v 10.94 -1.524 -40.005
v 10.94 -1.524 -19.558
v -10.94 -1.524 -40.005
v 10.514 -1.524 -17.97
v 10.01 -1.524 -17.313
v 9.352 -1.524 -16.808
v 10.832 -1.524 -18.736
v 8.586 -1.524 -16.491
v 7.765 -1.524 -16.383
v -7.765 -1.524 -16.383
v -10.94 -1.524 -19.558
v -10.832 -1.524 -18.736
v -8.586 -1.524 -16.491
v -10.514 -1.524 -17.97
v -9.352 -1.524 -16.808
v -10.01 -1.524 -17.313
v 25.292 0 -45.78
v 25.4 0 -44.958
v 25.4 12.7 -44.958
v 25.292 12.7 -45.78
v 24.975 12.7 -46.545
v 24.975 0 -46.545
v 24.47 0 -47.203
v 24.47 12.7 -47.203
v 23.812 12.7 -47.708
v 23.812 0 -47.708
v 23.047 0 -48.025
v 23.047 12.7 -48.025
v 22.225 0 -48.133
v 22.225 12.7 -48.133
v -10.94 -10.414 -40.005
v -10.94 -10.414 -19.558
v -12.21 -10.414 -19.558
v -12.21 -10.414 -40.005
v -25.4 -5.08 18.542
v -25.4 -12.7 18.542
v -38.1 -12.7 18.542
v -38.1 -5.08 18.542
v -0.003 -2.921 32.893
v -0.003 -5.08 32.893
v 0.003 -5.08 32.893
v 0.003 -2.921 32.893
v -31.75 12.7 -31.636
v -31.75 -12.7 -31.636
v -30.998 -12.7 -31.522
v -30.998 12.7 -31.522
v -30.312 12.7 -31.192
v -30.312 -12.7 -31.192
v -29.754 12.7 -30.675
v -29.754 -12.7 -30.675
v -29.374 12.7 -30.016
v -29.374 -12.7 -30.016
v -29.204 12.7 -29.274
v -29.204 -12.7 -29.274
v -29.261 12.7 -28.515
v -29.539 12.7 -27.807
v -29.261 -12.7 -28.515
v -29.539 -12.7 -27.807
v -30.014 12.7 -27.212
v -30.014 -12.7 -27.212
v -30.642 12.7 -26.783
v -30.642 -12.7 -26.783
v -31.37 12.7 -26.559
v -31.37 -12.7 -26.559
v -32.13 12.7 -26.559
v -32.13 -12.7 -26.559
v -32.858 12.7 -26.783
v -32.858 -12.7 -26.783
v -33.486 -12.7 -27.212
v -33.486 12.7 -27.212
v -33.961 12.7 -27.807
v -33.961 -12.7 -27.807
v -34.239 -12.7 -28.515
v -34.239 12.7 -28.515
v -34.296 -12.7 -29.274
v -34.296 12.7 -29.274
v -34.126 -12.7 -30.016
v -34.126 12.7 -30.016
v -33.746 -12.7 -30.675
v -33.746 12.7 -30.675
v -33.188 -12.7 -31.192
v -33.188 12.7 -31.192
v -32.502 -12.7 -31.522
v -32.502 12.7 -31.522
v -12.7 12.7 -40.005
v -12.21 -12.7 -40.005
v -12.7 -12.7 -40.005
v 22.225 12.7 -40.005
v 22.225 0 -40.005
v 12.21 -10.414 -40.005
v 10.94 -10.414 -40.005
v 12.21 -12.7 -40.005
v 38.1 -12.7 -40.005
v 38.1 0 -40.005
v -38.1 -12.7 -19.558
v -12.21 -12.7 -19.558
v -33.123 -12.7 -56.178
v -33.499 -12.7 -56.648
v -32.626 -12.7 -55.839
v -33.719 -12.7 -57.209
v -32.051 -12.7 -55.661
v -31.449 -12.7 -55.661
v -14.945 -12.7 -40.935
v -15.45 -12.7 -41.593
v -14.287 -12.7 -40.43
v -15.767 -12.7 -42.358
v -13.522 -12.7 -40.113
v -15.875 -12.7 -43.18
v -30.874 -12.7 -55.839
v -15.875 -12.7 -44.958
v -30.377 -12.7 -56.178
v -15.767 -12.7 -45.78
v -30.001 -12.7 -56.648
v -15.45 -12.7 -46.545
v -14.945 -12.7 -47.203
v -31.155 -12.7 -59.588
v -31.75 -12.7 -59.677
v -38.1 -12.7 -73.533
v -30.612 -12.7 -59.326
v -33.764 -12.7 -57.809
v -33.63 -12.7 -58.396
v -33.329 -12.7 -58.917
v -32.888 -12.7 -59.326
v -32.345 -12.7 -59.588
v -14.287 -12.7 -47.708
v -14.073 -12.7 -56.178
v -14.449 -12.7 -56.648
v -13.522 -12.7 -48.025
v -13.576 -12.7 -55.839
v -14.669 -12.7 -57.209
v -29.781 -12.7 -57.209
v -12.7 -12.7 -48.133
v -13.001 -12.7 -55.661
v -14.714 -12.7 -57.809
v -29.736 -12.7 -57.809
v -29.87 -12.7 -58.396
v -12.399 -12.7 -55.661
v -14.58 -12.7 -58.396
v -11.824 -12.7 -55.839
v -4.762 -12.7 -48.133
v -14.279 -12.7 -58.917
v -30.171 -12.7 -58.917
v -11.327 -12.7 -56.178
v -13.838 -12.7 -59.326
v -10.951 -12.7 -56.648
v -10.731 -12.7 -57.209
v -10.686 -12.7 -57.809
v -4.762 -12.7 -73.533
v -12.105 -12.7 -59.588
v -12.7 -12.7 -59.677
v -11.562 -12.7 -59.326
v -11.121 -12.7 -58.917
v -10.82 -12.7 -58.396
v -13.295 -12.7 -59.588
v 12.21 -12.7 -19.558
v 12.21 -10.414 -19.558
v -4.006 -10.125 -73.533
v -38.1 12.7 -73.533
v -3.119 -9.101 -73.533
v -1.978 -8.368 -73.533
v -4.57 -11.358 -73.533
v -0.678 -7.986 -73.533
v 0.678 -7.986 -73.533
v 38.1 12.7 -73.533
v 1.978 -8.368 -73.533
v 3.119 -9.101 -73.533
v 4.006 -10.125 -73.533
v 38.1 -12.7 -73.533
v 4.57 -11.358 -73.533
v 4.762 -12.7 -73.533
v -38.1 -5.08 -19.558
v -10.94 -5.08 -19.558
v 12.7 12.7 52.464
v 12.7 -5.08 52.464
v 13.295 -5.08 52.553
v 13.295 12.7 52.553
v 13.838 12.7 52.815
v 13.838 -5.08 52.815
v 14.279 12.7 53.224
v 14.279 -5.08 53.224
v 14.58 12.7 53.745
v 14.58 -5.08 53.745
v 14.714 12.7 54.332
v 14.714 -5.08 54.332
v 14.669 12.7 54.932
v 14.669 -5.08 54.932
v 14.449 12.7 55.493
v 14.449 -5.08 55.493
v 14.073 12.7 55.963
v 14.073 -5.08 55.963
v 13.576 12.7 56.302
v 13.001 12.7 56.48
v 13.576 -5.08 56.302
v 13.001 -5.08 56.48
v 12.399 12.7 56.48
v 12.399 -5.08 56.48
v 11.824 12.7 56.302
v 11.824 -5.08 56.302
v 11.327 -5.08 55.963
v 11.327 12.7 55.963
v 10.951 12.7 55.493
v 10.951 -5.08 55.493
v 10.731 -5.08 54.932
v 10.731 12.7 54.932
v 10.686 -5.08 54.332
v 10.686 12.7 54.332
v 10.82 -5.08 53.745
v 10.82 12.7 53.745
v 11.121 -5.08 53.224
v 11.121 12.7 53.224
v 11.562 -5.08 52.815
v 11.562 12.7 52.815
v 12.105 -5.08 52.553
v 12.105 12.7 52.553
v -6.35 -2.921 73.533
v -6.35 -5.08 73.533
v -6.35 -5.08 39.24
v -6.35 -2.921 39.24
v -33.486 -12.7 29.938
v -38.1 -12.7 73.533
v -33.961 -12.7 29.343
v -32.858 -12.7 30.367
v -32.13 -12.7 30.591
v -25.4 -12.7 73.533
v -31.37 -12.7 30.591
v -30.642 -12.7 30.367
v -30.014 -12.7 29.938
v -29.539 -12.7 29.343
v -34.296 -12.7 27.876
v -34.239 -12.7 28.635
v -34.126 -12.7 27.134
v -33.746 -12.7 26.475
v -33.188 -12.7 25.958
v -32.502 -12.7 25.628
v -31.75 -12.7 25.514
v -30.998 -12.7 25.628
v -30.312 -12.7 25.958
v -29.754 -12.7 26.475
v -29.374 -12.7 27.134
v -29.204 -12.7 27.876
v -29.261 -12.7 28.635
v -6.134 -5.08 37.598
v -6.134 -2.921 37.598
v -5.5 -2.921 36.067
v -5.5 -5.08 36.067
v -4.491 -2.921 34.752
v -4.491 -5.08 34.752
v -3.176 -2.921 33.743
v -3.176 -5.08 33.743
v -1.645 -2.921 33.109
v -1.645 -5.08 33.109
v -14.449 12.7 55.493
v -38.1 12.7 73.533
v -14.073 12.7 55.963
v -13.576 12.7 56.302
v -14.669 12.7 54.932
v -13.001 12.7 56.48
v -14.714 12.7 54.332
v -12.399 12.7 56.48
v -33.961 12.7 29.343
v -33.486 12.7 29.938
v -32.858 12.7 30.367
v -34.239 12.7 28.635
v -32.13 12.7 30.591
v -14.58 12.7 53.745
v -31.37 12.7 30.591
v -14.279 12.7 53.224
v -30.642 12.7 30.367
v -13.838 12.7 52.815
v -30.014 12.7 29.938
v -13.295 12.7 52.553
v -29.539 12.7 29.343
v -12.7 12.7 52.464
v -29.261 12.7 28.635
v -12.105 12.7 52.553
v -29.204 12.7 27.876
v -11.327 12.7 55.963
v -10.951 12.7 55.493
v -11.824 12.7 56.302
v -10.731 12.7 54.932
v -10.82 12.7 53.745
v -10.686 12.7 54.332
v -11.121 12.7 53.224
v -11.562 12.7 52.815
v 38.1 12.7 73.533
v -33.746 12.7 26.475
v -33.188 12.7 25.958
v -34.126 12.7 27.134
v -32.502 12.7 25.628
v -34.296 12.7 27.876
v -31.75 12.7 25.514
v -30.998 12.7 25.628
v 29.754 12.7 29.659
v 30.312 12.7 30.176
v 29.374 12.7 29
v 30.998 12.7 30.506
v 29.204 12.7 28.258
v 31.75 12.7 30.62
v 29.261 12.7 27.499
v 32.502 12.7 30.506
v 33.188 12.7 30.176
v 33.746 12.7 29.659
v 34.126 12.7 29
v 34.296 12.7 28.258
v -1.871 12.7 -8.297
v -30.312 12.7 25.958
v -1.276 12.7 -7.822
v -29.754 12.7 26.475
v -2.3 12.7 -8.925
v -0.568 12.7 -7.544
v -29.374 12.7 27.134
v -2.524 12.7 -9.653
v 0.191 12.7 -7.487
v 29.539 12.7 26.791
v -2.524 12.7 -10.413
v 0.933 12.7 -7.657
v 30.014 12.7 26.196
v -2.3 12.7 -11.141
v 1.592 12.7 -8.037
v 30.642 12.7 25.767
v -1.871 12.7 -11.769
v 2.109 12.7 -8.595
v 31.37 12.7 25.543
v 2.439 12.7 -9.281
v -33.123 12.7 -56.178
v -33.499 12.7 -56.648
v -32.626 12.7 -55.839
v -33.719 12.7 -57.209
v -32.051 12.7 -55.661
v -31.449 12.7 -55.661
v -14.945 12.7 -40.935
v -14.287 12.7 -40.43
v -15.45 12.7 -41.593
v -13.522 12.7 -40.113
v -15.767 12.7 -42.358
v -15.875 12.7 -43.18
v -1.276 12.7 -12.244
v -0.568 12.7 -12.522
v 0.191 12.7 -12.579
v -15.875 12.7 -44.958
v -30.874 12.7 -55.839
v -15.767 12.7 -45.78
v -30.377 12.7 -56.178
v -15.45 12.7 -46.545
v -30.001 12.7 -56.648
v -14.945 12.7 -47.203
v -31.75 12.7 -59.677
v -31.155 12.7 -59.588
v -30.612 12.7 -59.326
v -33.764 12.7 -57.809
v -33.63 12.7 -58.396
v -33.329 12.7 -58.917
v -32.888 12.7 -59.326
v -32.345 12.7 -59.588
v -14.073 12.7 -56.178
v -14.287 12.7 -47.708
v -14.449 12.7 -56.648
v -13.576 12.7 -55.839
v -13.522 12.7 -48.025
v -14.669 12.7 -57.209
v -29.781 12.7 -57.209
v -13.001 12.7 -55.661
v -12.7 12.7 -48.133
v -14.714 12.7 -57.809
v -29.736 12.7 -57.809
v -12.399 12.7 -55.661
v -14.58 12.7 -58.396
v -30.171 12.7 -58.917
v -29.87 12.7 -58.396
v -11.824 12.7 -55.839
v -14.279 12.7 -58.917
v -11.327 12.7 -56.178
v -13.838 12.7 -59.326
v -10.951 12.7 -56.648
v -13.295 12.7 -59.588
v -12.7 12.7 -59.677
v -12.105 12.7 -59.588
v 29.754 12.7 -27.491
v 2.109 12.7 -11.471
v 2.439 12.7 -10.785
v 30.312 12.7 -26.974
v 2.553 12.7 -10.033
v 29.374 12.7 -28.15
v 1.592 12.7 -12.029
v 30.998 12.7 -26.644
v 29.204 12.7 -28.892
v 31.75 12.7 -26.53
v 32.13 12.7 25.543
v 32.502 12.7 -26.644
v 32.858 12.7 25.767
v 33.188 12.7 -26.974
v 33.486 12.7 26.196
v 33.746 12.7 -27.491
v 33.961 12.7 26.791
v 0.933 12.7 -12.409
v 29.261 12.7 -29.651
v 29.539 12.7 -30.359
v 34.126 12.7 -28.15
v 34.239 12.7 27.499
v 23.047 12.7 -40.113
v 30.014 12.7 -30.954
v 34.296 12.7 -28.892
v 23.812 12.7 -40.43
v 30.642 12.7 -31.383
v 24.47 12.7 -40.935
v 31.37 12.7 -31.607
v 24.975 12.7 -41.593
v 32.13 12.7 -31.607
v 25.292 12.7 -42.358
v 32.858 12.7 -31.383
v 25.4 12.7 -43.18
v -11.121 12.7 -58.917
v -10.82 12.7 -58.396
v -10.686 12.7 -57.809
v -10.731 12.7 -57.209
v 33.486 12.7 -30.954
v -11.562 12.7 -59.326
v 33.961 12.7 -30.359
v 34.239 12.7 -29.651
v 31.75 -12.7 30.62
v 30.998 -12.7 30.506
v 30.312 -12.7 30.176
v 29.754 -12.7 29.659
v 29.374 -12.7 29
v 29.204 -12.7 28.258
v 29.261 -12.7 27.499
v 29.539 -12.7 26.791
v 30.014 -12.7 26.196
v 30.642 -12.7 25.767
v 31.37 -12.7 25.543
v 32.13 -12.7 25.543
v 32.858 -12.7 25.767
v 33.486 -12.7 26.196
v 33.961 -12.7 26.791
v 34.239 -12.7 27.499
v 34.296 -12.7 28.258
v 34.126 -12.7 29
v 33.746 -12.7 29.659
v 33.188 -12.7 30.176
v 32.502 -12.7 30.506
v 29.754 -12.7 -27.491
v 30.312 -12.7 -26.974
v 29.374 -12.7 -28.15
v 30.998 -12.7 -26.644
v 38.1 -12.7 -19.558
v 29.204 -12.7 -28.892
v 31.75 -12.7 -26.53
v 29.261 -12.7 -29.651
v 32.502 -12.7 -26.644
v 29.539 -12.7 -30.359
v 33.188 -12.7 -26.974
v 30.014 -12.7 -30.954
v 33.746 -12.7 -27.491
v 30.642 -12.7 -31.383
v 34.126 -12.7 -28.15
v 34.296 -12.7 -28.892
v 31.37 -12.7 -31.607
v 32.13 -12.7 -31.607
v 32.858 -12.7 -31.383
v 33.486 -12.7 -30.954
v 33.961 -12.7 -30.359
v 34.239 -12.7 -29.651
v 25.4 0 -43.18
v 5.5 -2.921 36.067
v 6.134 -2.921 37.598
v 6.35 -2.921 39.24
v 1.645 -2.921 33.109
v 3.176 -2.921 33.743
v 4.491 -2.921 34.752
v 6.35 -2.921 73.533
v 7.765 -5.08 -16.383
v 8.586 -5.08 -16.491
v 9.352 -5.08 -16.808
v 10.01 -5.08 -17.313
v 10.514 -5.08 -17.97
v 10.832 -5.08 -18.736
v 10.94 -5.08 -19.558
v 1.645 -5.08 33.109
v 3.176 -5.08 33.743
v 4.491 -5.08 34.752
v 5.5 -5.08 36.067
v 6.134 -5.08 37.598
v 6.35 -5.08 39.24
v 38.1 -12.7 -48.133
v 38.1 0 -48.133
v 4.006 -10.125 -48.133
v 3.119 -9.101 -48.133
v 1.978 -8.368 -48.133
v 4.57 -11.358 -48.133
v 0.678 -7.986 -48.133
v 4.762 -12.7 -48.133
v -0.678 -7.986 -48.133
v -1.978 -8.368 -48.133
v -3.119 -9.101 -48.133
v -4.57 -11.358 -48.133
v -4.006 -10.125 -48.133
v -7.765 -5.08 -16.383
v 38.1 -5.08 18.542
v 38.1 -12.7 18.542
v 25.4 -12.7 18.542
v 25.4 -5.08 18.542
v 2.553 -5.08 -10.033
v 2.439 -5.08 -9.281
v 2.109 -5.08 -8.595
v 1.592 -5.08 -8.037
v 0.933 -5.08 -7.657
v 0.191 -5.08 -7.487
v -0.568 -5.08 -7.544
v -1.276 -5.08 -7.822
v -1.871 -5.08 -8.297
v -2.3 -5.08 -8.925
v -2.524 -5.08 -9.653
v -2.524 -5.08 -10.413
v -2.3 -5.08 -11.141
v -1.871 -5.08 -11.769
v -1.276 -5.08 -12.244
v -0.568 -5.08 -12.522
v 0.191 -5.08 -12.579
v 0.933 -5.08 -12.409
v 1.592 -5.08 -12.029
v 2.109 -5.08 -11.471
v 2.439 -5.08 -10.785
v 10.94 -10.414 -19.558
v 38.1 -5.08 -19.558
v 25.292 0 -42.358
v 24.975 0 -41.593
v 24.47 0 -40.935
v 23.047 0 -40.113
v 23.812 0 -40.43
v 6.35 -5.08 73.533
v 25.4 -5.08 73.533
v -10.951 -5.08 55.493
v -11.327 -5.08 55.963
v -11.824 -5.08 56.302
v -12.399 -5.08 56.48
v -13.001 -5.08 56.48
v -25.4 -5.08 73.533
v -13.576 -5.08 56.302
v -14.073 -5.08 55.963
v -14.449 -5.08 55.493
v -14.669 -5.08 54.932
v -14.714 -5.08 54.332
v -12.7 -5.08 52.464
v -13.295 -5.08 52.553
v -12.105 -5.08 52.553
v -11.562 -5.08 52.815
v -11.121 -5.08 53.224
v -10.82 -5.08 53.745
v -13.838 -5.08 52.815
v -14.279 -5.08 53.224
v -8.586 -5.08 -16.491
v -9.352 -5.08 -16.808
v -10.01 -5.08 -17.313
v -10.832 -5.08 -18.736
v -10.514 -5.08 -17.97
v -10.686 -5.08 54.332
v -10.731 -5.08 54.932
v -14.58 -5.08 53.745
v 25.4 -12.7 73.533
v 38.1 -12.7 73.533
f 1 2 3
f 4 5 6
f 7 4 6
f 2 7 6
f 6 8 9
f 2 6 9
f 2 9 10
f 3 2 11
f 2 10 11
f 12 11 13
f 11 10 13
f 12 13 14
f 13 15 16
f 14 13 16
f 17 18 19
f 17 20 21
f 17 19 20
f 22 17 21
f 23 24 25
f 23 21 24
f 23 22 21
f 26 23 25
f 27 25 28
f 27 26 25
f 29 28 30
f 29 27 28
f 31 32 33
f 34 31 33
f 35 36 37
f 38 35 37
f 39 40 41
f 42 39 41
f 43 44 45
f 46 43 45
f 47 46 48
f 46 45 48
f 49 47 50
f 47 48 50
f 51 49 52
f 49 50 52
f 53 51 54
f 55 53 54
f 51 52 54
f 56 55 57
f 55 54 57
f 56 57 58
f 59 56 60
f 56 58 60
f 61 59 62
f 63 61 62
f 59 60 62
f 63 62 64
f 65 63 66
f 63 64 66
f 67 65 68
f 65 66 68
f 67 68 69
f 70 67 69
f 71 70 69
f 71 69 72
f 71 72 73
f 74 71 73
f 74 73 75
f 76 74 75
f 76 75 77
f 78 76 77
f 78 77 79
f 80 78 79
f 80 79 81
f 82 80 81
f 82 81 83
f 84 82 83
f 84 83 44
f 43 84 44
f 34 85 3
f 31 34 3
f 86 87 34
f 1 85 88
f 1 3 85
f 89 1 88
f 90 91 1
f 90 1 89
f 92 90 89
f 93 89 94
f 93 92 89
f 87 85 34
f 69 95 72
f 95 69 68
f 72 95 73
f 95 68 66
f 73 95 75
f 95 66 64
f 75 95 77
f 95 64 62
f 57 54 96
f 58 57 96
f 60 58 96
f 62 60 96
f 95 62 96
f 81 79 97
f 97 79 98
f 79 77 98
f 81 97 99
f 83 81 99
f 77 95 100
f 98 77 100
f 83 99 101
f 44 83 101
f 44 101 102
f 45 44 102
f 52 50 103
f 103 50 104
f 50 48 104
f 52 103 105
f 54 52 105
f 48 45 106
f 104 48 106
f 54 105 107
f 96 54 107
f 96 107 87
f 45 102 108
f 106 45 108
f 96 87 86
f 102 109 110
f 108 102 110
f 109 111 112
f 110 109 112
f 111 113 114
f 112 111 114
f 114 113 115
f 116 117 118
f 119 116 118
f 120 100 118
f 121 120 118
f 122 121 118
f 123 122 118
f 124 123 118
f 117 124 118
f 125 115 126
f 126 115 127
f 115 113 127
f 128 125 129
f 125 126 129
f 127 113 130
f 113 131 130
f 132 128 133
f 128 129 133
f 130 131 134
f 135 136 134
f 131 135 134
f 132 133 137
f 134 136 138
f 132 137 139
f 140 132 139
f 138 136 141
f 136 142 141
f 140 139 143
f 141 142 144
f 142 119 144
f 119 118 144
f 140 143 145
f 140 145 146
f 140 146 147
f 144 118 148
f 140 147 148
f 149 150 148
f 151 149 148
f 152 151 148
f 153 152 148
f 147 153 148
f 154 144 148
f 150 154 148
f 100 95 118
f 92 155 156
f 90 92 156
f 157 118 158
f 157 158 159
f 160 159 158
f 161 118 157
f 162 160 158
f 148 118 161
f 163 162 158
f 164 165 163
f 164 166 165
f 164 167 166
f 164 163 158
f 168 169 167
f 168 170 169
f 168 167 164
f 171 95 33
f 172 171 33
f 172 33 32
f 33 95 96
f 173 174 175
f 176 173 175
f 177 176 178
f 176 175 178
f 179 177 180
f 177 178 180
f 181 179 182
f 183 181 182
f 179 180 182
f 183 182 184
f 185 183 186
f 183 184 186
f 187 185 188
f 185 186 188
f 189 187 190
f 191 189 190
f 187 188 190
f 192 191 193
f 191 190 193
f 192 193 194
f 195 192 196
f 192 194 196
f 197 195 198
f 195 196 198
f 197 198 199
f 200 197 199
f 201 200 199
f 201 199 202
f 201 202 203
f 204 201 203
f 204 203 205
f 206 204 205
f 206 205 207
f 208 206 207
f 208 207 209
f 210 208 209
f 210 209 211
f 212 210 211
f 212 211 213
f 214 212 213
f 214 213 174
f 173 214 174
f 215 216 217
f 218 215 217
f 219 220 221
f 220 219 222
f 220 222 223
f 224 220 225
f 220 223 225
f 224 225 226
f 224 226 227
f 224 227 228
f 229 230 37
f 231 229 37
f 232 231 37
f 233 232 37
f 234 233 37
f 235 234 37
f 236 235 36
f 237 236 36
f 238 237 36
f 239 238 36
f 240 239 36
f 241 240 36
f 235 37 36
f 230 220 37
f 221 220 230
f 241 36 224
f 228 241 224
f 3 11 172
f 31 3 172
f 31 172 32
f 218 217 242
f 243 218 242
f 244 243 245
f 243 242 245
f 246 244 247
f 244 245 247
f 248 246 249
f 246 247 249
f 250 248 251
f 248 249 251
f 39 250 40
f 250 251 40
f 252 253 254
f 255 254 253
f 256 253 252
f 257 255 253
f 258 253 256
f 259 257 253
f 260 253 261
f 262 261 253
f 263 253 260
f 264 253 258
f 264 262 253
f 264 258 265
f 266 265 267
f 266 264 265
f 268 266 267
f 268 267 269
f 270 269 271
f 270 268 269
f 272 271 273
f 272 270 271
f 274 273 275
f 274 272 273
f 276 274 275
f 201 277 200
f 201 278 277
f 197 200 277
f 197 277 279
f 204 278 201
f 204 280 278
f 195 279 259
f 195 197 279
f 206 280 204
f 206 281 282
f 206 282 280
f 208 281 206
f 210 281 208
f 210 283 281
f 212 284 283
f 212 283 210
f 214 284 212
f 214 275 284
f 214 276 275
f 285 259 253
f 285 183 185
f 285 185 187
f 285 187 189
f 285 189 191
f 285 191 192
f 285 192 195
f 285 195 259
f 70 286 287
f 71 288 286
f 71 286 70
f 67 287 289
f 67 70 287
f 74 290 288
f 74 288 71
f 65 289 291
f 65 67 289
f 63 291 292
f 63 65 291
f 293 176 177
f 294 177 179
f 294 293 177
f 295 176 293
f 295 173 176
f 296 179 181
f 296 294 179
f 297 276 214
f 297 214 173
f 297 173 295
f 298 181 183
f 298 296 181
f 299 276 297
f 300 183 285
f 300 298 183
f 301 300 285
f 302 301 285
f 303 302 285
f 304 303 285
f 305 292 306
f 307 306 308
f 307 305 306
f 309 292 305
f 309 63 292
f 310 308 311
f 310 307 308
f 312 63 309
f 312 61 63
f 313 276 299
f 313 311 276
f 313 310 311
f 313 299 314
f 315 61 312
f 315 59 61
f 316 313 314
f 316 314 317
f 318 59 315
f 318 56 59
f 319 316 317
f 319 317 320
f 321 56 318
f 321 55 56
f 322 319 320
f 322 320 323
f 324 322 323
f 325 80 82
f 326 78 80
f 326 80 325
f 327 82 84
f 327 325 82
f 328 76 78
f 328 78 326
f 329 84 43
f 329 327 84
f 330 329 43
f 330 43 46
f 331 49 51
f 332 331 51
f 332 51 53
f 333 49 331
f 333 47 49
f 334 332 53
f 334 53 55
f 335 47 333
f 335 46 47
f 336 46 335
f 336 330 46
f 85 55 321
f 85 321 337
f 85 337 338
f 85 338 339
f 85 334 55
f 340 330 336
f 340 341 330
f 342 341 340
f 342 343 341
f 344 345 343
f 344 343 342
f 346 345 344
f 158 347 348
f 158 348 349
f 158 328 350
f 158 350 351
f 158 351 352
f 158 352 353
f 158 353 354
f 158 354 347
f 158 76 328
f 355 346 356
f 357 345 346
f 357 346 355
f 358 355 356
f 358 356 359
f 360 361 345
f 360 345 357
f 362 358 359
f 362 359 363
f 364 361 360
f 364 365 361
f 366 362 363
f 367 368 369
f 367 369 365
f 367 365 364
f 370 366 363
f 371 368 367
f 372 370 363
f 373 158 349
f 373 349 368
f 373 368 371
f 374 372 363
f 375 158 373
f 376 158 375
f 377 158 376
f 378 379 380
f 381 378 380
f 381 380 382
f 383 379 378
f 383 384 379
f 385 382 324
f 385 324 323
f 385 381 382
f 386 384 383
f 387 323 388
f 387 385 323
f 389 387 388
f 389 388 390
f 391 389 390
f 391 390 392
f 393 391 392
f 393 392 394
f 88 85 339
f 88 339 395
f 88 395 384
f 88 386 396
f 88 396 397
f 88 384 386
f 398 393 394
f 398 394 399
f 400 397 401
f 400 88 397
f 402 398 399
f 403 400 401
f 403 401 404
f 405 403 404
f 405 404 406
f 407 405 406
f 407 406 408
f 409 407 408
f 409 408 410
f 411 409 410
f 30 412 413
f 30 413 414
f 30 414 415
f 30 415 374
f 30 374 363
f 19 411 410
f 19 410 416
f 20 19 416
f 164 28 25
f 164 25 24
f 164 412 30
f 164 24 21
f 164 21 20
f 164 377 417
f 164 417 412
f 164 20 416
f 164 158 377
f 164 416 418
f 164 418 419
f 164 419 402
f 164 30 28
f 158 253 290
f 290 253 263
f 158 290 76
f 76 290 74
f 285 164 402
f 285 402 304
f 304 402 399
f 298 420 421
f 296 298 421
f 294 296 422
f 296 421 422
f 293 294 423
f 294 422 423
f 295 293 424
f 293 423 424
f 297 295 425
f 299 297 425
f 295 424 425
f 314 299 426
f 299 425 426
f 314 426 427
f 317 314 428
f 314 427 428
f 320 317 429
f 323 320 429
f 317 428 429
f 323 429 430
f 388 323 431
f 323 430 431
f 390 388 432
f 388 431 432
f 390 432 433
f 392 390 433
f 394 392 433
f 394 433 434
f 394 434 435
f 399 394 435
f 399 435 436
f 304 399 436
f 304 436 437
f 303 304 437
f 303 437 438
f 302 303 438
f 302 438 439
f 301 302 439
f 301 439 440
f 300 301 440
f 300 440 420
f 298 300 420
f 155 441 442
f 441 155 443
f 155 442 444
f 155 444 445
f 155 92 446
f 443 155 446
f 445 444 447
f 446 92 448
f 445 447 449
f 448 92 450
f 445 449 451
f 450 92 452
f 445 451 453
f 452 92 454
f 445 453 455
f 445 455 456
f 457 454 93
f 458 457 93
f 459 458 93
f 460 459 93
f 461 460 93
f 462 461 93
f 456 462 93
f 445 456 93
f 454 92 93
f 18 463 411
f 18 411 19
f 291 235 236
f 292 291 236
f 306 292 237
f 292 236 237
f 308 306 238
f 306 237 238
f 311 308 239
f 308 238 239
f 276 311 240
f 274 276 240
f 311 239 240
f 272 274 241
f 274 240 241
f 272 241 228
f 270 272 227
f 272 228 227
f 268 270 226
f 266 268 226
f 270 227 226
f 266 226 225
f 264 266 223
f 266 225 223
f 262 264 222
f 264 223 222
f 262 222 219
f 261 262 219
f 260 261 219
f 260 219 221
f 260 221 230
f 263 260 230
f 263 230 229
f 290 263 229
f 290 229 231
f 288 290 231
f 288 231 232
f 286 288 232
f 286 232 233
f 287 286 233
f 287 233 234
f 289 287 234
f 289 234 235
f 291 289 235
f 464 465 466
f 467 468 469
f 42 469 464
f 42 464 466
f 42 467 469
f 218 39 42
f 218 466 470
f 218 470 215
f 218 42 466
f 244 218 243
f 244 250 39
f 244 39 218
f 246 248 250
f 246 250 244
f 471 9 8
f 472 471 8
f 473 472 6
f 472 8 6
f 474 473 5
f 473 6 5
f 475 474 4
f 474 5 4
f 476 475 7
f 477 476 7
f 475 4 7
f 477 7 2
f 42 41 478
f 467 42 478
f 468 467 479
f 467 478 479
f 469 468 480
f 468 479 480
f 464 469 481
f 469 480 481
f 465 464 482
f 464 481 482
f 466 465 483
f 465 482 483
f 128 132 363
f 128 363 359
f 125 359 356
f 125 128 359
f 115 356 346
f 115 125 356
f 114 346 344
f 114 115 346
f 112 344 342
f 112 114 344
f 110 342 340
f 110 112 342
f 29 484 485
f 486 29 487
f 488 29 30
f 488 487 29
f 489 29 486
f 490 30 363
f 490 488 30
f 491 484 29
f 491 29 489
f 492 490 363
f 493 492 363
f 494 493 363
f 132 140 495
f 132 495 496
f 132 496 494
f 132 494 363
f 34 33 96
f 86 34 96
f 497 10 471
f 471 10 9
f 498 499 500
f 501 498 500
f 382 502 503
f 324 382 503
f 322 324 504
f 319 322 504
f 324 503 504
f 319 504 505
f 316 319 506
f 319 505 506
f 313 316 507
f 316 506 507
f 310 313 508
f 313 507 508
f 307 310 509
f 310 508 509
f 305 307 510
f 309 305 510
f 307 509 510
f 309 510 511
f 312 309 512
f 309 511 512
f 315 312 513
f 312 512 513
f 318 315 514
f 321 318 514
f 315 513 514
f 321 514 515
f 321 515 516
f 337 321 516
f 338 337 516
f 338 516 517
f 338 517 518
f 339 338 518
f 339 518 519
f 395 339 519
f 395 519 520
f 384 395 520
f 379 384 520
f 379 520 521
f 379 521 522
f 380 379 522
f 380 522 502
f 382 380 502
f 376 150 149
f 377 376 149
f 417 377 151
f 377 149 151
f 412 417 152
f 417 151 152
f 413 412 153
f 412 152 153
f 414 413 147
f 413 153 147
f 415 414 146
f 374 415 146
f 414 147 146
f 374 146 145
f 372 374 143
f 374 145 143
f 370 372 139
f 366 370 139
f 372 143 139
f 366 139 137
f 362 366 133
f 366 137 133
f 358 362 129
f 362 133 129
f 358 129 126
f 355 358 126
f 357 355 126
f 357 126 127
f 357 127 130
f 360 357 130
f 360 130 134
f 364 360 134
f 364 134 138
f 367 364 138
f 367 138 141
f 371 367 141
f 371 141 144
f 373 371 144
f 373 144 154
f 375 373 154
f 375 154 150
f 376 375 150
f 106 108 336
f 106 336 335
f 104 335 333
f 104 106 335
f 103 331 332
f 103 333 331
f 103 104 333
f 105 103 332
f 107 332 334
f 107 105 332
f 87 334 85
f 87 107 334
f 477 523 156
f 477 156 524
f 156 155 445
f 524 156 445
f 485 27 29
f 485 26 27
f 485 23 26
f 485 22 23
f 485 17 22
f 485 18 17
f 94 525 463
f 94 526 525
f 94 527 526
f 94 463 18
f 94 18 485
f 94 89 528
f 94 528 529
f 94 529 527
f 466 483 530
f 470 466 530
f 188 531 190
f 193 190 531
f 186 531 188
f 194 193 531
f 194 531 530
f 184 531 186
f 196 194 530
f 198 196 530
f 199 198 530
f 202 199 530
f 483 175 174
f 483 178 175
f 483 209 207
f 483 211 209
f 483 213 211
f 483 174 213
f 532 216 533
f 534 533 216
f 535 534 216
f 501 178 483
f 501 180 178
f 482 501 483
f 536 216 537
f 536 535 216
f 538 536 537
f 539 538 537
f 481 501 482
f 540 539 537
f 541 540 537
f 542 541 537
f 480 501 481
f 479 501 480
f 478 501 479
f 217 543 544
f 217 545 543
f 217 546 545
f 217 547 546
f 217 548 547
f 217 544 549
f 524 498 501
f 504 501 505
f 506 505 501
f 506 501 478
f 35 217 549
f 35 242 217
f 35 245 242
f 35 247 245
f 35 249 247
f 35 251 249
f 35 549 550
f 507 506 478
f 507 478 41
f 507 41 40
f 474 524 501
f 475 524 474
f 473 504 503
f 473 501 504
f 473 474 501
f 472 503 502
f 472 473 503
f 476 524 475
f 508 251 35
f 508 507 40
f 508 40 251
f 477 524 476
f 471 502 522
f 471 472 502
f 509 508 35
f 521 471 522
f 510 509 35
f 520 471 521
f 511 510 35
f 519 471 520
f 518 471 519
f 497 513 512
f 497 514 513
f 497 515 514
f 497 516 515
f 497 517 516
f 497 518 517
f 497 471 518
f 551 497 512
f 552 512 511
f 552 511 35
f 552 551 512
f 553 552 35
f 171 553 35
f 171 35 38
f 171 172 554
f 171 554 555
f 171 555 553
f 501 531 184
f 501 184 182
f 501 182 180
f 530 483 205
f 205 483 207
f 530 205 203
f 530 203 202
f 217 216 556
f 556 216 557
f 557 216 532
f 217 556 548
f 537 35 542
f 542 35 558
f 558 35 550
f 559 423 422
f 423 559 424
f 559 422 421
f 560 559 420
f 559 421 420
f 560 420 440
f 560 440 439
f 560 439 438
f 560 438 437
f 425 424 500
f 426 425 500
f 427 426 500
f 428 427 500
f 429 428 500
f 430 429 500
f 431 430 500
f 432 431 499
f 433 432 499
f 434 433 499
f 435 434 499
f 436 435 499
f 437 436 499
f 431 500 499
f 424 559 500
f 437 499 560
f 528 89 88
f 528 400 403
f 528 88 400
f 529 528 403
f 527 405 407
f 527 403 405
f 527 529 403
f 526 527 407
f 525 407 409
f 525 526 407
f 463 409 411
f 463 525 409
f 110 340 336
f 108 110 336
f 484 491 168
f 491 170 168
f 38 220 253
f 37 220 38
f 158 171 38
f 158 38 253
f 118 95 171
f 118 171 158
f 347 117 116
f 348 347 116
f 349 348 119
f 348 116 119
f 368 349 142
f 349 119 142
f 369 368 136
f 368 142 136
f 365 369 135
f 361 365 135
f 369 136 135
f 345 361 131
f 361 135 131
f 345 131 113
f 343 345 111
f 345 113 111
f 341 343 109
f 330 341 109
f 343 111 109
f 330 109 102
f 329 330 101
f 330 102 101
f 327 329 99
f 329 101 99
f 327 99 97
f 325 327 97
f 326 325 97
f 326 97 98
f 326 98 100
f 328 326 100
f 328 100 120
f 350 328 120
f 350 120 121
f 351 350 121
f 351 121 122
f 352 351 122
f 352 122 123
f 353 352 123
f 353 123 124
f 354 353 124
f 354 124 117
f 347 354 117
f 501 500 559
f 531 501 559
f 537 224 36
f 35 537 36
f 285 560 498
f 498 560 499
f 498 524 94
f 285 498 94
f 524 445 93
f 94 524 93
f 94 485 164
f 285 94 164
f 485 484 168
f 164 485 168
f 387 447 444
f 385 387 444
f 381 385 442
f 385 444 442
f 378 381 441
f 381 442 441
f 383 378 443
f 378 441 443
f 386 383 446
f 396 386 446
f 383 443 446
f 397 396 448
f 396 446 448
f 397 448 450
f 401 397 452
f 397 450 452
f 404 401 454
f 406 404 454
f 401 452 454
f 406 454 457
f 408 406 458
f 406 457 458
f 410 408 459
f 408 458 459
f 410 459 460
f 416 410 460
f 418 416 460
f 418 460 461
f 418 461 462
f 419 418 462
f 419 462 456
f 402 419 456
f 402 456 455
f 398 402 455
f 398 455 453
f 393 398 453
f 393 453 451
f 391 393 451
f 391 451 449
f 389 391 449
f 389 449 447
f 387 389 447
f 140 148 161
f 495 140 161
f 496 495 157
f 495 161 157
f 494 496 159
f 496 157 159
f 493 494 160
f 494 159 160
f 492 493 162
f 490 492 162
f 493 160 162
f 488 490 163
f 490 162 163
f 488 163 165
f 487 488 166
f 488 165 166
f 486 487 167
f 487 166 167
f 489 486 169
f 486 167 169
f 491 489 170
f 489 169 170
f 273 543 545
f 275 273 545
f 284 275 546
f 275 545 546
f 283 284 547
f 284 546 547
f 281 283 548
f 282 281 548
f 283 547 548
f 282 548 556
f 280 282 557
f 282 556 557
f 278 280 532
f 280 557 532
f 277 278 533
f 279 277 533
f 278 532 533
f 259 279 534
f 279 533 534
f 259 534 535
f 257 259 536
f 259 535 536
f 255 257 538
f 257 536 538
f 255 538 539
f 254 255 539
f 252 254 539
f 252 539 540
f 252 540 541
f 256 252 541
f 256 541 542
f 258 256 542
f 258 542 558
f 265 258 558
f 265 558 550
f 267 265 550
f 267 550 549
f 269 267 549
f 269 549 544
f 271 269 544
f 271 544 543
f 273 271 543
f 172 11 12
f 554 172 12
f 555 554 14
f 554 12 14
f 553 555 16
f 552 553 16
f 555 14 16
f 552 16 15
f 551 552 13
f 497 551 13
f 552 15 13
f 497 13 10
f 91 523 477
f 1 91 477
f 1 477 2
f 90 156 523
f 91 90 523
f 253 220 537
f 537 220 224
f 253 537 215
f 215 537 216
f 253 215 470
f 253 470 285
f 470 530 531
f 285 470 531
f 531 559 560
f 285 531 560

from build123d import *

# Parameters (mm, degrees)
BOSS_EXTRUDE1_DEPTH         = 12.7
BOSS_EXTRUDE1_DEPTH_BACK    = 12.7
SKETCH1_W                   = 76.2
SKETCH1_H                   = 147.066
SKETCH2_R                   = 4.7625
CUT_EXTRUDE1_DEPTH          = 25.4
CUT_EXTRUDE2_DEPTH          = 7.62
CUT_EXTRUDE4_DEPTH          = 84.785452729
CUT_EXTRUDE4_DEPTH_BACK     = 84.785452729
F_1_4_20_TAPPED_HOLE1_D     = 5.1054
F_1_4_20_TAPPED_HOLE1_DEPTH = 19.05
F_1_4_20_TAPPED_HOLE1_TIP   = 1.533816902
SKETCH9_R                   = 2.5527
SKETCH9_R_2                 = 2.0193
CUT_EXTRUDE5_DEPTH          = 87.62489301
CUT_EXTRUDE6_REACH          = 103.385
CUT_EXTRUDE7_DEPTH          = 2.159
SKETCH12_R                  = 2.0193
CUT_EXTRUDE8_DEPTH          = 85.704430162
SKETCH13_W                  = 15.875
SKETCH13_H                  = 8.128
CUT_EXTRUDE9_DEPTH          = 12.7
CUT_EXTRUDE10_DEPTH         = 85.02996052


with BuildPart() as part:
    # Sketch1 → Boss-Extrude1 (new, two sides: drawn at the far end of the back side and taken through both)
    with BuildSketch(Plane(origin=(0, 0, 0), x_dir=(1, 0, 0), z_dir=(0, 1, 0)).offset(-BOSS_EXTRUDE1_DEPTH_BACK)):
        Rectangle(SKETCH1_W, SKETCH1_H)
    extrude(amount=BOSS_EXTRUDE1_DEPTH + BOSS_EXTRUDE1_DEPTH_BACK)

    # Sketch2 → Cut-Extrude1 (cut)
    with BuildSketch(Plane(origin=(0, 0, -73.533), x_dir=(-1, 0, 0), z_dir=(0, 0, -1))):
        with Locations((0, -12.7)):
            Circle(SKETCH2_R)
    extrude(amount=-CUT_EXTRUDE1_DEPTH, mode=Mode.SUBTRACT)

    # Sketch3 → Cut-Extrude2 (cut)
    with BuildSketch(Plane(origin=(0, -12.7, 0), x_dir=(-1, 0, 0), z_dir=(0, -1, 0))):
        with BuildLine():
            Line((-19.05, -83.058), (19.05, -83.058))
            ThreePointArc((19.05, -83.058), (23.540128061, -81.198128061), (25.4, -76.708))
            Line((25.4, -76.708), (25.4, -18.542))
            Line((25.4, -18.542), (44.45, -18.542))
            Line((44.45, -18.542), (44.45, 19.558))
            Line((44.45, 19.558), (-44.45, 19.558))
            Line((-44.45, 19.558), (-44.45, -18.542))
            Line((-44.45, -18.542), (-25.4, -18.542))
            Line((-25.4, -18.542), (-25.4, -76.708))
            ThreePointArc((-25.4, -76.708), (-23.540128061, -81.198128061), (-19.05, -83.058))
        make_face()
    extrude(amount=-CUT_EXTRUDE2_DEPTH, mode=Mode.SUBTRACT)

    # Sketch5 → Cut-Extrude4 (cut, two sides: drawn at the far end of the back side and taken through both)
    with BuildSketch(Plane(origin=(0, 0, 0), x_dir=(1, 0, 0), z_dir=(0, 1, 0)).offset(-CUT_EXTRUDE4_DEPTH_BACK)):
        with BuildLine():
            Line((22.225, 48.133), (-12.7, 48.133))
            ThreePointArc((-12.7, 48.133), (-14.94506403, 47.20306403), (-15.875, 44.958))
            Line((-15.875, 44.958), (-15.875, 43.18))
            ThreePointArc((-15.875, 43.18), (-14.94506403, 40.93493597), (-12.7, 40.005))
            Line((-12.7, 40.005), (22.225, 40.005))
            ThreePointArc((22.225, 40.005), (24.47006403, 40.93493597), (25.4, 43.18))
            Line((25.4, 43.18), (25.4, 44.958))
            ThreePointArc((25.4, 44.958), (24.47006403, 47.20306403), (22.225, 48.133))
        make_face()
    extrude(amount=CUT_EXTRUDE4_DEPTH + CUT_EXTRUDE4_DEPTH_BACK, mode=Mode.SUBTRACT)

    # 1/4-20 Tapped Hole1
    with Locations(Plane(origin=(-11.034450397, 12.7, 14.547513529), x_dir=(-1, 0, 0), z_dir=(0, 1, 0))):
        with Locations((-11.034450397, -24.580513529)):
            Hole(F_1_4_20_TAPPED_HOLE1_D / 2, depth=F_1_4_20_TAPPED_HOLE1_DEPTH)
            with Locations((0, 0, -(F_1_4_20_TAPPED_HOLE1_DEPTH + F_1_4_20_TAPPED_HOLE1_TIP / 2))):  # 118° drill point
                Cone(0, F_1_4_20_TAPPED_HOLE1_D / 2, F_1_4_20_TAPPED_HOLE1_TIP, mode=Mode.SUBTRACT)

    # Sketch9 → Cut-Extrude5 (cut, through all)
    with BuildSketch(Plane(origin=(0, -12.7, 0), x_dir=(-1, 0, 0), z_dir=(0, -1, 0))):
        with Locations((31.75, 29.083)):
            Circle(SKETCH9_R)
        with Locations((31.75, -28.067)):
            Circle(SKETCH9_R)
        with Locations((-31.75, -28.067)):
            Circle(SKETCH9_R)
        with Locations((-31.75, 29.083)):
            Circle(SKETCH9_R)
        with Locations((31.75, 57.658)):
            Circle(SKETCH9_R_2)
        with Locations((12.7, 57.658)):
            Circle(SKETCH9_R_2)
    extrude(amount=-CUT_EXTRUDE5_DEPTH, mode=Mode.SUBTRACT)

    # Sketch10 → Cut-Extrude6 (cut, up to next)
    with BuildSketch(Plane.XY.offset(-19.558), mode=Mode.PRIVATE) as cut_extrude6_sk1:
        with BuildLine():
            Line((-10.939706577, -10.414), (-12.209706577, -10.414))
            Line((-12.209706577, -10.414), (-12.209706577, -14.986))
            Line((-12.209706577, -14.986), (-10.939706577, -14.986))
            ThreePointArc((-10.939706577, -14.986), (0, -23.876), (10.939706577, -14.986))
            Line((10.939706577, -14.986), (12.209706577, -14.986))
            Line((12.209706577, -14.986), (12.209706577, -10.414))
            Line((12.209706577, -10.414), (10.939706577, -10.414))
            Line((10.939706577, -10.414), (10.939706577, -1.524))
            Line((10.939706577, -1.524), (-10.939706577, -1.524))
            Line((-10.939706577, -1.524), (-10.939706577, -10.414))
        make_face()
    cut_extrude6_tool1 = extrude(cut_extrude6_sk1.sketch, amount=-CUT_EXTRUDE6_REACH, mode=Mode.PRIVATE) & part.part
    add(cut_extrude6_tool1.solids().sort_by_distance((0, -11.73366, -19.558))[0], mode=Mode.SUBTRACT)

    # Sketch11 → Cut-Extrude7 (cut)
    with BuildSketch(Plane(origin=(0, -5.08, 0), x_dir=(-1, 0, 0), z_dir=(0, -1, 0))):
        with BuildLine():
            Line((0.00254, -32.893), (-0.00254, -32.893))
            ThreePointArc((-0.00254, -32.893), (-4.490872009, -34.752127991), (-6.35, -39.24046))
            Line((-6.35, -39.24046), (-6.35, -73.533))
            Line((-6.35, -73.533), (6.35, -73.533))
            Line((6.35, -73.533), (6.35, -39.24046))
            ThreePointArc((6.35, -39.24046), (4.490872009, -34.752127991), (0.00254, -32.893))
        make_face()
    extrude(amount=-CUT_EXTRUDE7_DEPTH, mode=Mode.SUBTRACT)

    # Sketch12 → Cut-Extrude8 (cut, through all)
    with BuildSketch(Plane.XZ.offset(5.08)):
        with Locations((12.7, 54.483)):
            Circle(SKETCH12_R)
        with Locations((-12.7, 54.483)):
            Circle(SKETCH12_R)
    extrude(amount=-CUT_EXTRUDE8_DEPTH, mode=Mode.SUBTRACT)

    # Sketch13 → Cut-Extrude9 (cut)
    with BuildSketch(Plane.XZ.offset(12.7)):
        with Locations((30.1625, -44.069)):
            Rectangle(SKETCH13_W, SKETCH13_H)
    extrude(amount=-CUT_EXTRUDE9_DEPTH, mode=Mode.SUBTRACT)

    # Sketch14 → Cut-Extrude10 (cut, through all)
    with BuildSketch(Plane.XZ.offset(1.524)):
        with BuildLine():
            Line((7.764706577, -22.733), (-7.764706577, -22.733))
            ThreePointArc((-7.764706577, -22.733), (-10.939706577, -19.558), (-7.764706577, -16.383))
            Line((-7.764706577, -16.383), (7.764706577, -16.383))
            ThreePointArc((7.764706577, -16.383), (10.939706577, -19.558), (7.764706577, -22.733))
        make_face()
    extrude(amount=CUT_EXTRUDE10_DEPTH, mode=Mode.SUBTRACT)


solid = part.part
